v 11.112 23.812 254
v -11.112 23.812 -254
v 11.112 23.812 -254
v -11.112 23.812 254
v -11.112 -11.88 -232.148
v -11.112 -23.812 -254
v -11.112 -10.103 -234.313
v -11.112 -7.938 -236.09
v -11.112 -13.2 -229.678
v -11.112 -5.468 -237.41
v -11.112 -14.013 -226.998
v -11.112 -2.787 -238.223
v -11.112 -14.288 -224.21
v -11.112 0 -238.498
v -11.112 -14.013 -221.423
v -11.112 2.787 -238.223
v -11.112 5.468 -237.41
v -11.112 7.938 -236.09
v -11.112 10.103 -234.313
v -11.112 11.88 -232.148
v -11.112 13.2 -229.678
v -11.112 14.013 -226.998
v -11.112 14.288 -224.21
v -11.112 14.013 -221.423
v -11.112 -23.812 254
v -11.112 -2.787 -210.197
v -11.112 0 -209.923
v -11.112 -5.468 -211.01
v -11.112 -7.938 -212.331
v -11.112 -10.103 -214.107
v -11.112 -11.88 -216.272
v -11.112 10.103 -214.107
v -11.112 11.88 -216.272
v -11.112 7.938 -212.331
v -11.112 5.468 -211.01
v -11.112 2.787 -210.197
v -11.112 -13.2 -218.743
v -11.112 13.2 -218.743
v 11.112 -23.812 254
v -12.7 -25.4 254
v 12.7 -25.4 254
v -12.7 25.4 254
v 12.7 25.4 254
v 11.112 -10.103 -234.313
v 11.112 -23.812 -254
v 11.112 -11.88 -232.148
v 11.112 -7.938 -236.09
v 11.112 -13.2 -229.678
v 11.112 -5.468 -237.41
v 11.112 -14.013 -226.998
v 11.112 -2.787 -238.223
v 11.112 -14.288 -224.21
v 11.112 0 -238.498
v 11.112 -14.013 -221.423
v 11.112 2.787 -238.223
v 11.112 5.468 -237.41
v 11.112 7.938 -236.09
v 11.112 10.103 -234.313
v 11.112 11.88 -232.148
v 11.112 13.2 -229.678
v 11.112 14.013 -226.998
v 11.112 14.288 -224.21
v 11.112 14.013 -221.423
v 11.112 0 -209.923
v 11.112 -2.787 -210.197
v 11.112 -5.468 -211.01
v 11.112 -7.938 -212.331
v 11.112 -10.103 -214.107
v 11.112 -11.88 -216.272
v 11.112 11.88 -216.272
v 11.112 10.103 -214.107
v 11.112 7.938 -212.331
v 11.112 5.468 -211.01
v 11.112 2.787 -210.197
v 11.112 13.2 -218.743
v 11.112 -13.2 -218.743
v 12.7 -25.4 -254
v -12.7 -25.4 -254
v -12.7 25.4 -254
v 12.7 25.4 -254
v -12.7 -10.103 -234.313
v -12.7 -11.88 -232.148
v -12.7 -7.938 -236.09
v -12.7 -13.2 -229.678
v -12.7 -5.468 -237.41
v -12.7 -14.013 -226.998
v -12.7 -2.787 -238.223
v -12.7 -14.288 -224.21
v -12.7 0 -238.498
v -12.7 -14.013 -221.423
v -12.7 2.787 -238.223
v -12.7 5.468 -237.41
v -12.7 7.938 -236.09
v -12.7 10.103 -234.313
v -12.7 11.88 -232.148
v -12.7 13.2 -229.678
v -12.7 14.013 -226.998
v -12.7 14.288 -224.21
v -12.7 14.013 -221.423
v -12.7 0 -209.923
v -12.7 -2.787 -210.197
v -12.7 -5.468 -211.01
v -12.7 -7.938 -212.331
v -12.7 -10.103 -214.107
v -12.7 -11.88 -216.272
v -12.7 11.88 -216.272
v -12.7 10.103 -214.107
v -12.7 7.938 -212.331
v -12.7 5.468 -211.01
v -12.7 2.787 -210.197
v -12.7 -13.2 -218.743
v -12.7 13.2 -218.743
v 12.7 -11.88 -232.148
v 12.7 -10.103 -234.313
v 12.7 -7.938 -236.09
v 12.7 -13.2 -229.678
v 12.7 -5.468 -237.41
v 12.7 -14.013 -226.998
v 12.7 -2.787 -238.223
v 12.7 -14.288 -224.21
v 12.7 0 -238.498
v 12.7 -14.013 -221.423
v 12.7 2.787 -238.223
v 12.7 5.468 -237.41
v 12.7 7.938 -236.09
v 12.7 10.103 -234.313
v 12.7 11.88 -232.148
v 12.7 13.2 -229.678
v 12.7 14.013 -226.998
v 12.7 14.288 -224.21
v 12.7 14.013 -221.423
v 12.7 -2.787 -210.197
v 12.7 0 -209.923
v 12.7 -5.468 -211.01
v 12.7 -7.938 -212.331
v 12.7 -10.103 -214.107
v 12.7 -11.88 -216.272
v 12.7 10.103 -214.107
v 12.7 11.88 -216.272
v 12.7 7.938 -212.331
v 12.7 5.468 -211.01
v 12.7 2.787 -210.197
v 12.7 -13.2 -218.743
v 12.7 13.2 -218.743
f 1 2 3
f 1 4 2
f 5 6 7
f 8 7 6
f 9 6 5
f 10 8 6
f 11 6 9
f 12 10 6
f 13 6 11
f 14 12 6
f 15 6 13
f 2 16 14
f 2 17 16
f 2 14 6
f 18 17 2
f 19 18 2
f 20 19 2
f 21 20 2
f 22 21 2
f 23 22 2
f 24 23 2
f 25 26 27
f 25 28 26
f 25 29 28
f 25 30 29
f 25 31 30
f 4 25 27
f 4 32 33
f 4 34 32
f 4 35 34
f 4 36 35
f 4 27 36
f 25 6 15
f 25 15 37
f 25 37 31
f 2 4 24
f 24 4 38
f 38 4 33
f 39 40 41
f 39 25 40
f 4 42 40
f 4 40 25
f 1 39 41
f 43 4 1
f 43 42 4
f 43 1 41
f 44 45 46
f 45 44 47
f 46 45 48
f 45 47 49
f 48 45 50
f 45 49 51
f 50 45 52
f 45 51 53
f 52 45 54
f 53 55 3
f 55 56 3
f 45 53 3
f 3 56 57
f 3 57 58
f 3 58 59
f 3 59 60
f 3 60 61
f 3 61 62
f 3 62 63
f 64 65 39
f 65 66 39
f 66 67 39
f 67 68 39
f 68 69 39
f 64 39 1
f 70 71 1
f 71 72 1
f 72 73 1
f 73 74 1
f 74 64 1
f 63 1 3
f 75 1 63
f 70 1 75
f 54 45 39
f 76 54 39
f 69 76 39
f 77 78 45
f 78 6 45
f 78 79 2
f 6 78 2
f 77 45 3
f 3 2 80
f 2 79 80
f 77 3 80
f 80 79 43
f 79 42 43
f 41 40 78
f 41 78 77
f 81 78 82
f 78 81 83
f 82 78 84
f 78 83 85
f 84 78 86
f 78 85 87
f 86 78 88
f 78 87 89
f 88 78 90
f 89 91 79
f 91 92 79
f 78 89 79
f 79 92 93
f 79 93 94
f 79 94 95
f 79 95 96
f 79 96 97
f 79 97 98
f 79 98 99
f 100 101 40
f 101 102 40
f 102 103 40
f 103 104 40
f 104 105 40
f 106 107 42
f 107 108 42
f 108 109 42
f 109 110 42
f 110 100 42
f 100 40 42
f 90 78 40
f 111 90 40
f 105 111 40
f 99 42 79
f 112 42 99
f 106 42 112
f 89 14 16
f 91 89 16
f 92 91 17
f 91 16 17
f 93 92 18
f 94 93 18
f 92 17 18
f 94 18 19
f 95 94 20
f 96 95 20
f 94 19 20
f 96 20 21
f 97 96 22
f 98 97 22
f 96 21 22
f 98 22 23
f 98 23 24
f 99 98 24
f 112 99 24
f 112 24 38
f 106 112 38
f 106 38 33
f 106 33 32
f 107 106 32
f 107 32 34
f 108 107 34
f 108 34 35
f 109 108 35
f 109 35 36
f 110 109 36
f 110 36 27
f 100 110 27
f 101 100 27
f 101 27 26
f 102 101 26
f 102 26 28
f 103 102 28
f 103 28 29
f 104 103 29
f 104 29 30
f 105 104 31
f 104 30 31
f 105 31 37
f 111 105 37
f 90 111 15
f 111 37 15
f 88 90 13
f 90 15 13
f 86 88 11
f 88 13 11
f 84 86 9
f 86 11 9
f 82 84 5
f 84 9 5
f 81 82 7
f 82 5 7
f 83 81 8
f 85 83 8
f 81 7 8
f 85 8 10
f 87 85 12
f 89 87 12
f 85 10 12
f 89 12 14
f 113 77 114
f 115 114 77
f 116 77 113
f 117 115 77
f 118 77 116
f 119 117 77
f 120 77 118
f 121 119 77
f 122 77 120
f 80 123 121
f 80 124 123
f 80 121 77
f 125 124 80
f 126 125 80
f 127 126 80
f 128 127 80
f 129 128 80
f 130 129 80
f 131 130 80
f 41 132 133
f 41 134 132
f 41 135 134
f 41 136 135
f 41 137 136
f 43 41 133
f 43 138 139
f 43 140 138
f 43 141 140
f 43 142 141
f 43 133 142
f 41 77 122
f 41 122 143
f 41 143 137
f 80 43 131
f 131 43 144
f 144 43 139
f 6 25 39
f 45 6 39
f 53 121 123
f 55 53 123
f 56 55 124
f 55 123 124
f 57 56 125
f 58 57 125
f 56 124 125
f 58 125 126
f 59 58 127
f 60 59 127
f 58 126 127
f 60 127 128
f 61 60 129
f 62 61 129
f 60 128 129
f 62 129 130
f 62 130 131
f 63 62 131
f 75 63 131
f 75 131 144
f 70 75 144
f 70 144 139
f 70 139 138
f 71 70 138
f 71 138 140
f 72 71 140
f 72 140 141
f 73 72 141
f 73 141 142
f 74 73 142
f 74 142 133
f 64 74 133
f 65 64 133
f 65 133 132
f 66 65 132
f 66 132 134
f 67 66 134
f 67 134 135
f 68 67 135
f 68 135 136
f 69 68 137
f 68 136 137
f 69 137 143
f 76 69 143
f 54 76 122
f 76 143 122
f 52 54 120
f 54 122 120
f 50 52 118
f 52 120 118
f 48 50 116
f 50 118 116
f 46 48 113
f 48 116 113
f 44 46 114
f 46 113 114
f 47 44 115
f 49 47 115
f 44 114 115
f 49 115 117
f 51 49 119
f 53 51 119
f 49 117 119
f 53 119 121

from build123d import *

# Parameters (mm, degrees)
SKETCH1_W           = 25.4
SKETCH1_H           = 50.8
SKETCH1_W_2         = 22.225
SKETCH1_H_2         = 47.625
BOSS_EXTRUDE1_DEPTH = 254
SKETCH2_R           = 14.2875
CUT_EXTRUDE1_DEPTH  = 257.527425434


with BuildPart() as part:
    # Sketch1 → Boss-Extrude1 (new, symmetric)
    with BuildSketch(Plane.XY):
        Rectangle(SKETCH1_W, SKETCH1_H)
        Rectangle(SKETCH1_W_2, SKETCH1_H_2, mode=Mode.SUBTRACT)
    extrude(amount=BOSS_EXTRUDE1_DEPTH, both=True)

    # Sketch2 → Cut-Extrude1 (cut, through all)
    with BuildSketch(Plane(origin=(12.7, 0, 0), x_dir=(0, 0, -1), z_dir=(1, 0, 0))):
        with Locations((224.210207487, 0)):
            Circle(SKETCH2_R)
    extrude(amount=-CUT_EXTRUDE1_DEPTH, mode=Mode.SUBTRACT)


solid = part.part
